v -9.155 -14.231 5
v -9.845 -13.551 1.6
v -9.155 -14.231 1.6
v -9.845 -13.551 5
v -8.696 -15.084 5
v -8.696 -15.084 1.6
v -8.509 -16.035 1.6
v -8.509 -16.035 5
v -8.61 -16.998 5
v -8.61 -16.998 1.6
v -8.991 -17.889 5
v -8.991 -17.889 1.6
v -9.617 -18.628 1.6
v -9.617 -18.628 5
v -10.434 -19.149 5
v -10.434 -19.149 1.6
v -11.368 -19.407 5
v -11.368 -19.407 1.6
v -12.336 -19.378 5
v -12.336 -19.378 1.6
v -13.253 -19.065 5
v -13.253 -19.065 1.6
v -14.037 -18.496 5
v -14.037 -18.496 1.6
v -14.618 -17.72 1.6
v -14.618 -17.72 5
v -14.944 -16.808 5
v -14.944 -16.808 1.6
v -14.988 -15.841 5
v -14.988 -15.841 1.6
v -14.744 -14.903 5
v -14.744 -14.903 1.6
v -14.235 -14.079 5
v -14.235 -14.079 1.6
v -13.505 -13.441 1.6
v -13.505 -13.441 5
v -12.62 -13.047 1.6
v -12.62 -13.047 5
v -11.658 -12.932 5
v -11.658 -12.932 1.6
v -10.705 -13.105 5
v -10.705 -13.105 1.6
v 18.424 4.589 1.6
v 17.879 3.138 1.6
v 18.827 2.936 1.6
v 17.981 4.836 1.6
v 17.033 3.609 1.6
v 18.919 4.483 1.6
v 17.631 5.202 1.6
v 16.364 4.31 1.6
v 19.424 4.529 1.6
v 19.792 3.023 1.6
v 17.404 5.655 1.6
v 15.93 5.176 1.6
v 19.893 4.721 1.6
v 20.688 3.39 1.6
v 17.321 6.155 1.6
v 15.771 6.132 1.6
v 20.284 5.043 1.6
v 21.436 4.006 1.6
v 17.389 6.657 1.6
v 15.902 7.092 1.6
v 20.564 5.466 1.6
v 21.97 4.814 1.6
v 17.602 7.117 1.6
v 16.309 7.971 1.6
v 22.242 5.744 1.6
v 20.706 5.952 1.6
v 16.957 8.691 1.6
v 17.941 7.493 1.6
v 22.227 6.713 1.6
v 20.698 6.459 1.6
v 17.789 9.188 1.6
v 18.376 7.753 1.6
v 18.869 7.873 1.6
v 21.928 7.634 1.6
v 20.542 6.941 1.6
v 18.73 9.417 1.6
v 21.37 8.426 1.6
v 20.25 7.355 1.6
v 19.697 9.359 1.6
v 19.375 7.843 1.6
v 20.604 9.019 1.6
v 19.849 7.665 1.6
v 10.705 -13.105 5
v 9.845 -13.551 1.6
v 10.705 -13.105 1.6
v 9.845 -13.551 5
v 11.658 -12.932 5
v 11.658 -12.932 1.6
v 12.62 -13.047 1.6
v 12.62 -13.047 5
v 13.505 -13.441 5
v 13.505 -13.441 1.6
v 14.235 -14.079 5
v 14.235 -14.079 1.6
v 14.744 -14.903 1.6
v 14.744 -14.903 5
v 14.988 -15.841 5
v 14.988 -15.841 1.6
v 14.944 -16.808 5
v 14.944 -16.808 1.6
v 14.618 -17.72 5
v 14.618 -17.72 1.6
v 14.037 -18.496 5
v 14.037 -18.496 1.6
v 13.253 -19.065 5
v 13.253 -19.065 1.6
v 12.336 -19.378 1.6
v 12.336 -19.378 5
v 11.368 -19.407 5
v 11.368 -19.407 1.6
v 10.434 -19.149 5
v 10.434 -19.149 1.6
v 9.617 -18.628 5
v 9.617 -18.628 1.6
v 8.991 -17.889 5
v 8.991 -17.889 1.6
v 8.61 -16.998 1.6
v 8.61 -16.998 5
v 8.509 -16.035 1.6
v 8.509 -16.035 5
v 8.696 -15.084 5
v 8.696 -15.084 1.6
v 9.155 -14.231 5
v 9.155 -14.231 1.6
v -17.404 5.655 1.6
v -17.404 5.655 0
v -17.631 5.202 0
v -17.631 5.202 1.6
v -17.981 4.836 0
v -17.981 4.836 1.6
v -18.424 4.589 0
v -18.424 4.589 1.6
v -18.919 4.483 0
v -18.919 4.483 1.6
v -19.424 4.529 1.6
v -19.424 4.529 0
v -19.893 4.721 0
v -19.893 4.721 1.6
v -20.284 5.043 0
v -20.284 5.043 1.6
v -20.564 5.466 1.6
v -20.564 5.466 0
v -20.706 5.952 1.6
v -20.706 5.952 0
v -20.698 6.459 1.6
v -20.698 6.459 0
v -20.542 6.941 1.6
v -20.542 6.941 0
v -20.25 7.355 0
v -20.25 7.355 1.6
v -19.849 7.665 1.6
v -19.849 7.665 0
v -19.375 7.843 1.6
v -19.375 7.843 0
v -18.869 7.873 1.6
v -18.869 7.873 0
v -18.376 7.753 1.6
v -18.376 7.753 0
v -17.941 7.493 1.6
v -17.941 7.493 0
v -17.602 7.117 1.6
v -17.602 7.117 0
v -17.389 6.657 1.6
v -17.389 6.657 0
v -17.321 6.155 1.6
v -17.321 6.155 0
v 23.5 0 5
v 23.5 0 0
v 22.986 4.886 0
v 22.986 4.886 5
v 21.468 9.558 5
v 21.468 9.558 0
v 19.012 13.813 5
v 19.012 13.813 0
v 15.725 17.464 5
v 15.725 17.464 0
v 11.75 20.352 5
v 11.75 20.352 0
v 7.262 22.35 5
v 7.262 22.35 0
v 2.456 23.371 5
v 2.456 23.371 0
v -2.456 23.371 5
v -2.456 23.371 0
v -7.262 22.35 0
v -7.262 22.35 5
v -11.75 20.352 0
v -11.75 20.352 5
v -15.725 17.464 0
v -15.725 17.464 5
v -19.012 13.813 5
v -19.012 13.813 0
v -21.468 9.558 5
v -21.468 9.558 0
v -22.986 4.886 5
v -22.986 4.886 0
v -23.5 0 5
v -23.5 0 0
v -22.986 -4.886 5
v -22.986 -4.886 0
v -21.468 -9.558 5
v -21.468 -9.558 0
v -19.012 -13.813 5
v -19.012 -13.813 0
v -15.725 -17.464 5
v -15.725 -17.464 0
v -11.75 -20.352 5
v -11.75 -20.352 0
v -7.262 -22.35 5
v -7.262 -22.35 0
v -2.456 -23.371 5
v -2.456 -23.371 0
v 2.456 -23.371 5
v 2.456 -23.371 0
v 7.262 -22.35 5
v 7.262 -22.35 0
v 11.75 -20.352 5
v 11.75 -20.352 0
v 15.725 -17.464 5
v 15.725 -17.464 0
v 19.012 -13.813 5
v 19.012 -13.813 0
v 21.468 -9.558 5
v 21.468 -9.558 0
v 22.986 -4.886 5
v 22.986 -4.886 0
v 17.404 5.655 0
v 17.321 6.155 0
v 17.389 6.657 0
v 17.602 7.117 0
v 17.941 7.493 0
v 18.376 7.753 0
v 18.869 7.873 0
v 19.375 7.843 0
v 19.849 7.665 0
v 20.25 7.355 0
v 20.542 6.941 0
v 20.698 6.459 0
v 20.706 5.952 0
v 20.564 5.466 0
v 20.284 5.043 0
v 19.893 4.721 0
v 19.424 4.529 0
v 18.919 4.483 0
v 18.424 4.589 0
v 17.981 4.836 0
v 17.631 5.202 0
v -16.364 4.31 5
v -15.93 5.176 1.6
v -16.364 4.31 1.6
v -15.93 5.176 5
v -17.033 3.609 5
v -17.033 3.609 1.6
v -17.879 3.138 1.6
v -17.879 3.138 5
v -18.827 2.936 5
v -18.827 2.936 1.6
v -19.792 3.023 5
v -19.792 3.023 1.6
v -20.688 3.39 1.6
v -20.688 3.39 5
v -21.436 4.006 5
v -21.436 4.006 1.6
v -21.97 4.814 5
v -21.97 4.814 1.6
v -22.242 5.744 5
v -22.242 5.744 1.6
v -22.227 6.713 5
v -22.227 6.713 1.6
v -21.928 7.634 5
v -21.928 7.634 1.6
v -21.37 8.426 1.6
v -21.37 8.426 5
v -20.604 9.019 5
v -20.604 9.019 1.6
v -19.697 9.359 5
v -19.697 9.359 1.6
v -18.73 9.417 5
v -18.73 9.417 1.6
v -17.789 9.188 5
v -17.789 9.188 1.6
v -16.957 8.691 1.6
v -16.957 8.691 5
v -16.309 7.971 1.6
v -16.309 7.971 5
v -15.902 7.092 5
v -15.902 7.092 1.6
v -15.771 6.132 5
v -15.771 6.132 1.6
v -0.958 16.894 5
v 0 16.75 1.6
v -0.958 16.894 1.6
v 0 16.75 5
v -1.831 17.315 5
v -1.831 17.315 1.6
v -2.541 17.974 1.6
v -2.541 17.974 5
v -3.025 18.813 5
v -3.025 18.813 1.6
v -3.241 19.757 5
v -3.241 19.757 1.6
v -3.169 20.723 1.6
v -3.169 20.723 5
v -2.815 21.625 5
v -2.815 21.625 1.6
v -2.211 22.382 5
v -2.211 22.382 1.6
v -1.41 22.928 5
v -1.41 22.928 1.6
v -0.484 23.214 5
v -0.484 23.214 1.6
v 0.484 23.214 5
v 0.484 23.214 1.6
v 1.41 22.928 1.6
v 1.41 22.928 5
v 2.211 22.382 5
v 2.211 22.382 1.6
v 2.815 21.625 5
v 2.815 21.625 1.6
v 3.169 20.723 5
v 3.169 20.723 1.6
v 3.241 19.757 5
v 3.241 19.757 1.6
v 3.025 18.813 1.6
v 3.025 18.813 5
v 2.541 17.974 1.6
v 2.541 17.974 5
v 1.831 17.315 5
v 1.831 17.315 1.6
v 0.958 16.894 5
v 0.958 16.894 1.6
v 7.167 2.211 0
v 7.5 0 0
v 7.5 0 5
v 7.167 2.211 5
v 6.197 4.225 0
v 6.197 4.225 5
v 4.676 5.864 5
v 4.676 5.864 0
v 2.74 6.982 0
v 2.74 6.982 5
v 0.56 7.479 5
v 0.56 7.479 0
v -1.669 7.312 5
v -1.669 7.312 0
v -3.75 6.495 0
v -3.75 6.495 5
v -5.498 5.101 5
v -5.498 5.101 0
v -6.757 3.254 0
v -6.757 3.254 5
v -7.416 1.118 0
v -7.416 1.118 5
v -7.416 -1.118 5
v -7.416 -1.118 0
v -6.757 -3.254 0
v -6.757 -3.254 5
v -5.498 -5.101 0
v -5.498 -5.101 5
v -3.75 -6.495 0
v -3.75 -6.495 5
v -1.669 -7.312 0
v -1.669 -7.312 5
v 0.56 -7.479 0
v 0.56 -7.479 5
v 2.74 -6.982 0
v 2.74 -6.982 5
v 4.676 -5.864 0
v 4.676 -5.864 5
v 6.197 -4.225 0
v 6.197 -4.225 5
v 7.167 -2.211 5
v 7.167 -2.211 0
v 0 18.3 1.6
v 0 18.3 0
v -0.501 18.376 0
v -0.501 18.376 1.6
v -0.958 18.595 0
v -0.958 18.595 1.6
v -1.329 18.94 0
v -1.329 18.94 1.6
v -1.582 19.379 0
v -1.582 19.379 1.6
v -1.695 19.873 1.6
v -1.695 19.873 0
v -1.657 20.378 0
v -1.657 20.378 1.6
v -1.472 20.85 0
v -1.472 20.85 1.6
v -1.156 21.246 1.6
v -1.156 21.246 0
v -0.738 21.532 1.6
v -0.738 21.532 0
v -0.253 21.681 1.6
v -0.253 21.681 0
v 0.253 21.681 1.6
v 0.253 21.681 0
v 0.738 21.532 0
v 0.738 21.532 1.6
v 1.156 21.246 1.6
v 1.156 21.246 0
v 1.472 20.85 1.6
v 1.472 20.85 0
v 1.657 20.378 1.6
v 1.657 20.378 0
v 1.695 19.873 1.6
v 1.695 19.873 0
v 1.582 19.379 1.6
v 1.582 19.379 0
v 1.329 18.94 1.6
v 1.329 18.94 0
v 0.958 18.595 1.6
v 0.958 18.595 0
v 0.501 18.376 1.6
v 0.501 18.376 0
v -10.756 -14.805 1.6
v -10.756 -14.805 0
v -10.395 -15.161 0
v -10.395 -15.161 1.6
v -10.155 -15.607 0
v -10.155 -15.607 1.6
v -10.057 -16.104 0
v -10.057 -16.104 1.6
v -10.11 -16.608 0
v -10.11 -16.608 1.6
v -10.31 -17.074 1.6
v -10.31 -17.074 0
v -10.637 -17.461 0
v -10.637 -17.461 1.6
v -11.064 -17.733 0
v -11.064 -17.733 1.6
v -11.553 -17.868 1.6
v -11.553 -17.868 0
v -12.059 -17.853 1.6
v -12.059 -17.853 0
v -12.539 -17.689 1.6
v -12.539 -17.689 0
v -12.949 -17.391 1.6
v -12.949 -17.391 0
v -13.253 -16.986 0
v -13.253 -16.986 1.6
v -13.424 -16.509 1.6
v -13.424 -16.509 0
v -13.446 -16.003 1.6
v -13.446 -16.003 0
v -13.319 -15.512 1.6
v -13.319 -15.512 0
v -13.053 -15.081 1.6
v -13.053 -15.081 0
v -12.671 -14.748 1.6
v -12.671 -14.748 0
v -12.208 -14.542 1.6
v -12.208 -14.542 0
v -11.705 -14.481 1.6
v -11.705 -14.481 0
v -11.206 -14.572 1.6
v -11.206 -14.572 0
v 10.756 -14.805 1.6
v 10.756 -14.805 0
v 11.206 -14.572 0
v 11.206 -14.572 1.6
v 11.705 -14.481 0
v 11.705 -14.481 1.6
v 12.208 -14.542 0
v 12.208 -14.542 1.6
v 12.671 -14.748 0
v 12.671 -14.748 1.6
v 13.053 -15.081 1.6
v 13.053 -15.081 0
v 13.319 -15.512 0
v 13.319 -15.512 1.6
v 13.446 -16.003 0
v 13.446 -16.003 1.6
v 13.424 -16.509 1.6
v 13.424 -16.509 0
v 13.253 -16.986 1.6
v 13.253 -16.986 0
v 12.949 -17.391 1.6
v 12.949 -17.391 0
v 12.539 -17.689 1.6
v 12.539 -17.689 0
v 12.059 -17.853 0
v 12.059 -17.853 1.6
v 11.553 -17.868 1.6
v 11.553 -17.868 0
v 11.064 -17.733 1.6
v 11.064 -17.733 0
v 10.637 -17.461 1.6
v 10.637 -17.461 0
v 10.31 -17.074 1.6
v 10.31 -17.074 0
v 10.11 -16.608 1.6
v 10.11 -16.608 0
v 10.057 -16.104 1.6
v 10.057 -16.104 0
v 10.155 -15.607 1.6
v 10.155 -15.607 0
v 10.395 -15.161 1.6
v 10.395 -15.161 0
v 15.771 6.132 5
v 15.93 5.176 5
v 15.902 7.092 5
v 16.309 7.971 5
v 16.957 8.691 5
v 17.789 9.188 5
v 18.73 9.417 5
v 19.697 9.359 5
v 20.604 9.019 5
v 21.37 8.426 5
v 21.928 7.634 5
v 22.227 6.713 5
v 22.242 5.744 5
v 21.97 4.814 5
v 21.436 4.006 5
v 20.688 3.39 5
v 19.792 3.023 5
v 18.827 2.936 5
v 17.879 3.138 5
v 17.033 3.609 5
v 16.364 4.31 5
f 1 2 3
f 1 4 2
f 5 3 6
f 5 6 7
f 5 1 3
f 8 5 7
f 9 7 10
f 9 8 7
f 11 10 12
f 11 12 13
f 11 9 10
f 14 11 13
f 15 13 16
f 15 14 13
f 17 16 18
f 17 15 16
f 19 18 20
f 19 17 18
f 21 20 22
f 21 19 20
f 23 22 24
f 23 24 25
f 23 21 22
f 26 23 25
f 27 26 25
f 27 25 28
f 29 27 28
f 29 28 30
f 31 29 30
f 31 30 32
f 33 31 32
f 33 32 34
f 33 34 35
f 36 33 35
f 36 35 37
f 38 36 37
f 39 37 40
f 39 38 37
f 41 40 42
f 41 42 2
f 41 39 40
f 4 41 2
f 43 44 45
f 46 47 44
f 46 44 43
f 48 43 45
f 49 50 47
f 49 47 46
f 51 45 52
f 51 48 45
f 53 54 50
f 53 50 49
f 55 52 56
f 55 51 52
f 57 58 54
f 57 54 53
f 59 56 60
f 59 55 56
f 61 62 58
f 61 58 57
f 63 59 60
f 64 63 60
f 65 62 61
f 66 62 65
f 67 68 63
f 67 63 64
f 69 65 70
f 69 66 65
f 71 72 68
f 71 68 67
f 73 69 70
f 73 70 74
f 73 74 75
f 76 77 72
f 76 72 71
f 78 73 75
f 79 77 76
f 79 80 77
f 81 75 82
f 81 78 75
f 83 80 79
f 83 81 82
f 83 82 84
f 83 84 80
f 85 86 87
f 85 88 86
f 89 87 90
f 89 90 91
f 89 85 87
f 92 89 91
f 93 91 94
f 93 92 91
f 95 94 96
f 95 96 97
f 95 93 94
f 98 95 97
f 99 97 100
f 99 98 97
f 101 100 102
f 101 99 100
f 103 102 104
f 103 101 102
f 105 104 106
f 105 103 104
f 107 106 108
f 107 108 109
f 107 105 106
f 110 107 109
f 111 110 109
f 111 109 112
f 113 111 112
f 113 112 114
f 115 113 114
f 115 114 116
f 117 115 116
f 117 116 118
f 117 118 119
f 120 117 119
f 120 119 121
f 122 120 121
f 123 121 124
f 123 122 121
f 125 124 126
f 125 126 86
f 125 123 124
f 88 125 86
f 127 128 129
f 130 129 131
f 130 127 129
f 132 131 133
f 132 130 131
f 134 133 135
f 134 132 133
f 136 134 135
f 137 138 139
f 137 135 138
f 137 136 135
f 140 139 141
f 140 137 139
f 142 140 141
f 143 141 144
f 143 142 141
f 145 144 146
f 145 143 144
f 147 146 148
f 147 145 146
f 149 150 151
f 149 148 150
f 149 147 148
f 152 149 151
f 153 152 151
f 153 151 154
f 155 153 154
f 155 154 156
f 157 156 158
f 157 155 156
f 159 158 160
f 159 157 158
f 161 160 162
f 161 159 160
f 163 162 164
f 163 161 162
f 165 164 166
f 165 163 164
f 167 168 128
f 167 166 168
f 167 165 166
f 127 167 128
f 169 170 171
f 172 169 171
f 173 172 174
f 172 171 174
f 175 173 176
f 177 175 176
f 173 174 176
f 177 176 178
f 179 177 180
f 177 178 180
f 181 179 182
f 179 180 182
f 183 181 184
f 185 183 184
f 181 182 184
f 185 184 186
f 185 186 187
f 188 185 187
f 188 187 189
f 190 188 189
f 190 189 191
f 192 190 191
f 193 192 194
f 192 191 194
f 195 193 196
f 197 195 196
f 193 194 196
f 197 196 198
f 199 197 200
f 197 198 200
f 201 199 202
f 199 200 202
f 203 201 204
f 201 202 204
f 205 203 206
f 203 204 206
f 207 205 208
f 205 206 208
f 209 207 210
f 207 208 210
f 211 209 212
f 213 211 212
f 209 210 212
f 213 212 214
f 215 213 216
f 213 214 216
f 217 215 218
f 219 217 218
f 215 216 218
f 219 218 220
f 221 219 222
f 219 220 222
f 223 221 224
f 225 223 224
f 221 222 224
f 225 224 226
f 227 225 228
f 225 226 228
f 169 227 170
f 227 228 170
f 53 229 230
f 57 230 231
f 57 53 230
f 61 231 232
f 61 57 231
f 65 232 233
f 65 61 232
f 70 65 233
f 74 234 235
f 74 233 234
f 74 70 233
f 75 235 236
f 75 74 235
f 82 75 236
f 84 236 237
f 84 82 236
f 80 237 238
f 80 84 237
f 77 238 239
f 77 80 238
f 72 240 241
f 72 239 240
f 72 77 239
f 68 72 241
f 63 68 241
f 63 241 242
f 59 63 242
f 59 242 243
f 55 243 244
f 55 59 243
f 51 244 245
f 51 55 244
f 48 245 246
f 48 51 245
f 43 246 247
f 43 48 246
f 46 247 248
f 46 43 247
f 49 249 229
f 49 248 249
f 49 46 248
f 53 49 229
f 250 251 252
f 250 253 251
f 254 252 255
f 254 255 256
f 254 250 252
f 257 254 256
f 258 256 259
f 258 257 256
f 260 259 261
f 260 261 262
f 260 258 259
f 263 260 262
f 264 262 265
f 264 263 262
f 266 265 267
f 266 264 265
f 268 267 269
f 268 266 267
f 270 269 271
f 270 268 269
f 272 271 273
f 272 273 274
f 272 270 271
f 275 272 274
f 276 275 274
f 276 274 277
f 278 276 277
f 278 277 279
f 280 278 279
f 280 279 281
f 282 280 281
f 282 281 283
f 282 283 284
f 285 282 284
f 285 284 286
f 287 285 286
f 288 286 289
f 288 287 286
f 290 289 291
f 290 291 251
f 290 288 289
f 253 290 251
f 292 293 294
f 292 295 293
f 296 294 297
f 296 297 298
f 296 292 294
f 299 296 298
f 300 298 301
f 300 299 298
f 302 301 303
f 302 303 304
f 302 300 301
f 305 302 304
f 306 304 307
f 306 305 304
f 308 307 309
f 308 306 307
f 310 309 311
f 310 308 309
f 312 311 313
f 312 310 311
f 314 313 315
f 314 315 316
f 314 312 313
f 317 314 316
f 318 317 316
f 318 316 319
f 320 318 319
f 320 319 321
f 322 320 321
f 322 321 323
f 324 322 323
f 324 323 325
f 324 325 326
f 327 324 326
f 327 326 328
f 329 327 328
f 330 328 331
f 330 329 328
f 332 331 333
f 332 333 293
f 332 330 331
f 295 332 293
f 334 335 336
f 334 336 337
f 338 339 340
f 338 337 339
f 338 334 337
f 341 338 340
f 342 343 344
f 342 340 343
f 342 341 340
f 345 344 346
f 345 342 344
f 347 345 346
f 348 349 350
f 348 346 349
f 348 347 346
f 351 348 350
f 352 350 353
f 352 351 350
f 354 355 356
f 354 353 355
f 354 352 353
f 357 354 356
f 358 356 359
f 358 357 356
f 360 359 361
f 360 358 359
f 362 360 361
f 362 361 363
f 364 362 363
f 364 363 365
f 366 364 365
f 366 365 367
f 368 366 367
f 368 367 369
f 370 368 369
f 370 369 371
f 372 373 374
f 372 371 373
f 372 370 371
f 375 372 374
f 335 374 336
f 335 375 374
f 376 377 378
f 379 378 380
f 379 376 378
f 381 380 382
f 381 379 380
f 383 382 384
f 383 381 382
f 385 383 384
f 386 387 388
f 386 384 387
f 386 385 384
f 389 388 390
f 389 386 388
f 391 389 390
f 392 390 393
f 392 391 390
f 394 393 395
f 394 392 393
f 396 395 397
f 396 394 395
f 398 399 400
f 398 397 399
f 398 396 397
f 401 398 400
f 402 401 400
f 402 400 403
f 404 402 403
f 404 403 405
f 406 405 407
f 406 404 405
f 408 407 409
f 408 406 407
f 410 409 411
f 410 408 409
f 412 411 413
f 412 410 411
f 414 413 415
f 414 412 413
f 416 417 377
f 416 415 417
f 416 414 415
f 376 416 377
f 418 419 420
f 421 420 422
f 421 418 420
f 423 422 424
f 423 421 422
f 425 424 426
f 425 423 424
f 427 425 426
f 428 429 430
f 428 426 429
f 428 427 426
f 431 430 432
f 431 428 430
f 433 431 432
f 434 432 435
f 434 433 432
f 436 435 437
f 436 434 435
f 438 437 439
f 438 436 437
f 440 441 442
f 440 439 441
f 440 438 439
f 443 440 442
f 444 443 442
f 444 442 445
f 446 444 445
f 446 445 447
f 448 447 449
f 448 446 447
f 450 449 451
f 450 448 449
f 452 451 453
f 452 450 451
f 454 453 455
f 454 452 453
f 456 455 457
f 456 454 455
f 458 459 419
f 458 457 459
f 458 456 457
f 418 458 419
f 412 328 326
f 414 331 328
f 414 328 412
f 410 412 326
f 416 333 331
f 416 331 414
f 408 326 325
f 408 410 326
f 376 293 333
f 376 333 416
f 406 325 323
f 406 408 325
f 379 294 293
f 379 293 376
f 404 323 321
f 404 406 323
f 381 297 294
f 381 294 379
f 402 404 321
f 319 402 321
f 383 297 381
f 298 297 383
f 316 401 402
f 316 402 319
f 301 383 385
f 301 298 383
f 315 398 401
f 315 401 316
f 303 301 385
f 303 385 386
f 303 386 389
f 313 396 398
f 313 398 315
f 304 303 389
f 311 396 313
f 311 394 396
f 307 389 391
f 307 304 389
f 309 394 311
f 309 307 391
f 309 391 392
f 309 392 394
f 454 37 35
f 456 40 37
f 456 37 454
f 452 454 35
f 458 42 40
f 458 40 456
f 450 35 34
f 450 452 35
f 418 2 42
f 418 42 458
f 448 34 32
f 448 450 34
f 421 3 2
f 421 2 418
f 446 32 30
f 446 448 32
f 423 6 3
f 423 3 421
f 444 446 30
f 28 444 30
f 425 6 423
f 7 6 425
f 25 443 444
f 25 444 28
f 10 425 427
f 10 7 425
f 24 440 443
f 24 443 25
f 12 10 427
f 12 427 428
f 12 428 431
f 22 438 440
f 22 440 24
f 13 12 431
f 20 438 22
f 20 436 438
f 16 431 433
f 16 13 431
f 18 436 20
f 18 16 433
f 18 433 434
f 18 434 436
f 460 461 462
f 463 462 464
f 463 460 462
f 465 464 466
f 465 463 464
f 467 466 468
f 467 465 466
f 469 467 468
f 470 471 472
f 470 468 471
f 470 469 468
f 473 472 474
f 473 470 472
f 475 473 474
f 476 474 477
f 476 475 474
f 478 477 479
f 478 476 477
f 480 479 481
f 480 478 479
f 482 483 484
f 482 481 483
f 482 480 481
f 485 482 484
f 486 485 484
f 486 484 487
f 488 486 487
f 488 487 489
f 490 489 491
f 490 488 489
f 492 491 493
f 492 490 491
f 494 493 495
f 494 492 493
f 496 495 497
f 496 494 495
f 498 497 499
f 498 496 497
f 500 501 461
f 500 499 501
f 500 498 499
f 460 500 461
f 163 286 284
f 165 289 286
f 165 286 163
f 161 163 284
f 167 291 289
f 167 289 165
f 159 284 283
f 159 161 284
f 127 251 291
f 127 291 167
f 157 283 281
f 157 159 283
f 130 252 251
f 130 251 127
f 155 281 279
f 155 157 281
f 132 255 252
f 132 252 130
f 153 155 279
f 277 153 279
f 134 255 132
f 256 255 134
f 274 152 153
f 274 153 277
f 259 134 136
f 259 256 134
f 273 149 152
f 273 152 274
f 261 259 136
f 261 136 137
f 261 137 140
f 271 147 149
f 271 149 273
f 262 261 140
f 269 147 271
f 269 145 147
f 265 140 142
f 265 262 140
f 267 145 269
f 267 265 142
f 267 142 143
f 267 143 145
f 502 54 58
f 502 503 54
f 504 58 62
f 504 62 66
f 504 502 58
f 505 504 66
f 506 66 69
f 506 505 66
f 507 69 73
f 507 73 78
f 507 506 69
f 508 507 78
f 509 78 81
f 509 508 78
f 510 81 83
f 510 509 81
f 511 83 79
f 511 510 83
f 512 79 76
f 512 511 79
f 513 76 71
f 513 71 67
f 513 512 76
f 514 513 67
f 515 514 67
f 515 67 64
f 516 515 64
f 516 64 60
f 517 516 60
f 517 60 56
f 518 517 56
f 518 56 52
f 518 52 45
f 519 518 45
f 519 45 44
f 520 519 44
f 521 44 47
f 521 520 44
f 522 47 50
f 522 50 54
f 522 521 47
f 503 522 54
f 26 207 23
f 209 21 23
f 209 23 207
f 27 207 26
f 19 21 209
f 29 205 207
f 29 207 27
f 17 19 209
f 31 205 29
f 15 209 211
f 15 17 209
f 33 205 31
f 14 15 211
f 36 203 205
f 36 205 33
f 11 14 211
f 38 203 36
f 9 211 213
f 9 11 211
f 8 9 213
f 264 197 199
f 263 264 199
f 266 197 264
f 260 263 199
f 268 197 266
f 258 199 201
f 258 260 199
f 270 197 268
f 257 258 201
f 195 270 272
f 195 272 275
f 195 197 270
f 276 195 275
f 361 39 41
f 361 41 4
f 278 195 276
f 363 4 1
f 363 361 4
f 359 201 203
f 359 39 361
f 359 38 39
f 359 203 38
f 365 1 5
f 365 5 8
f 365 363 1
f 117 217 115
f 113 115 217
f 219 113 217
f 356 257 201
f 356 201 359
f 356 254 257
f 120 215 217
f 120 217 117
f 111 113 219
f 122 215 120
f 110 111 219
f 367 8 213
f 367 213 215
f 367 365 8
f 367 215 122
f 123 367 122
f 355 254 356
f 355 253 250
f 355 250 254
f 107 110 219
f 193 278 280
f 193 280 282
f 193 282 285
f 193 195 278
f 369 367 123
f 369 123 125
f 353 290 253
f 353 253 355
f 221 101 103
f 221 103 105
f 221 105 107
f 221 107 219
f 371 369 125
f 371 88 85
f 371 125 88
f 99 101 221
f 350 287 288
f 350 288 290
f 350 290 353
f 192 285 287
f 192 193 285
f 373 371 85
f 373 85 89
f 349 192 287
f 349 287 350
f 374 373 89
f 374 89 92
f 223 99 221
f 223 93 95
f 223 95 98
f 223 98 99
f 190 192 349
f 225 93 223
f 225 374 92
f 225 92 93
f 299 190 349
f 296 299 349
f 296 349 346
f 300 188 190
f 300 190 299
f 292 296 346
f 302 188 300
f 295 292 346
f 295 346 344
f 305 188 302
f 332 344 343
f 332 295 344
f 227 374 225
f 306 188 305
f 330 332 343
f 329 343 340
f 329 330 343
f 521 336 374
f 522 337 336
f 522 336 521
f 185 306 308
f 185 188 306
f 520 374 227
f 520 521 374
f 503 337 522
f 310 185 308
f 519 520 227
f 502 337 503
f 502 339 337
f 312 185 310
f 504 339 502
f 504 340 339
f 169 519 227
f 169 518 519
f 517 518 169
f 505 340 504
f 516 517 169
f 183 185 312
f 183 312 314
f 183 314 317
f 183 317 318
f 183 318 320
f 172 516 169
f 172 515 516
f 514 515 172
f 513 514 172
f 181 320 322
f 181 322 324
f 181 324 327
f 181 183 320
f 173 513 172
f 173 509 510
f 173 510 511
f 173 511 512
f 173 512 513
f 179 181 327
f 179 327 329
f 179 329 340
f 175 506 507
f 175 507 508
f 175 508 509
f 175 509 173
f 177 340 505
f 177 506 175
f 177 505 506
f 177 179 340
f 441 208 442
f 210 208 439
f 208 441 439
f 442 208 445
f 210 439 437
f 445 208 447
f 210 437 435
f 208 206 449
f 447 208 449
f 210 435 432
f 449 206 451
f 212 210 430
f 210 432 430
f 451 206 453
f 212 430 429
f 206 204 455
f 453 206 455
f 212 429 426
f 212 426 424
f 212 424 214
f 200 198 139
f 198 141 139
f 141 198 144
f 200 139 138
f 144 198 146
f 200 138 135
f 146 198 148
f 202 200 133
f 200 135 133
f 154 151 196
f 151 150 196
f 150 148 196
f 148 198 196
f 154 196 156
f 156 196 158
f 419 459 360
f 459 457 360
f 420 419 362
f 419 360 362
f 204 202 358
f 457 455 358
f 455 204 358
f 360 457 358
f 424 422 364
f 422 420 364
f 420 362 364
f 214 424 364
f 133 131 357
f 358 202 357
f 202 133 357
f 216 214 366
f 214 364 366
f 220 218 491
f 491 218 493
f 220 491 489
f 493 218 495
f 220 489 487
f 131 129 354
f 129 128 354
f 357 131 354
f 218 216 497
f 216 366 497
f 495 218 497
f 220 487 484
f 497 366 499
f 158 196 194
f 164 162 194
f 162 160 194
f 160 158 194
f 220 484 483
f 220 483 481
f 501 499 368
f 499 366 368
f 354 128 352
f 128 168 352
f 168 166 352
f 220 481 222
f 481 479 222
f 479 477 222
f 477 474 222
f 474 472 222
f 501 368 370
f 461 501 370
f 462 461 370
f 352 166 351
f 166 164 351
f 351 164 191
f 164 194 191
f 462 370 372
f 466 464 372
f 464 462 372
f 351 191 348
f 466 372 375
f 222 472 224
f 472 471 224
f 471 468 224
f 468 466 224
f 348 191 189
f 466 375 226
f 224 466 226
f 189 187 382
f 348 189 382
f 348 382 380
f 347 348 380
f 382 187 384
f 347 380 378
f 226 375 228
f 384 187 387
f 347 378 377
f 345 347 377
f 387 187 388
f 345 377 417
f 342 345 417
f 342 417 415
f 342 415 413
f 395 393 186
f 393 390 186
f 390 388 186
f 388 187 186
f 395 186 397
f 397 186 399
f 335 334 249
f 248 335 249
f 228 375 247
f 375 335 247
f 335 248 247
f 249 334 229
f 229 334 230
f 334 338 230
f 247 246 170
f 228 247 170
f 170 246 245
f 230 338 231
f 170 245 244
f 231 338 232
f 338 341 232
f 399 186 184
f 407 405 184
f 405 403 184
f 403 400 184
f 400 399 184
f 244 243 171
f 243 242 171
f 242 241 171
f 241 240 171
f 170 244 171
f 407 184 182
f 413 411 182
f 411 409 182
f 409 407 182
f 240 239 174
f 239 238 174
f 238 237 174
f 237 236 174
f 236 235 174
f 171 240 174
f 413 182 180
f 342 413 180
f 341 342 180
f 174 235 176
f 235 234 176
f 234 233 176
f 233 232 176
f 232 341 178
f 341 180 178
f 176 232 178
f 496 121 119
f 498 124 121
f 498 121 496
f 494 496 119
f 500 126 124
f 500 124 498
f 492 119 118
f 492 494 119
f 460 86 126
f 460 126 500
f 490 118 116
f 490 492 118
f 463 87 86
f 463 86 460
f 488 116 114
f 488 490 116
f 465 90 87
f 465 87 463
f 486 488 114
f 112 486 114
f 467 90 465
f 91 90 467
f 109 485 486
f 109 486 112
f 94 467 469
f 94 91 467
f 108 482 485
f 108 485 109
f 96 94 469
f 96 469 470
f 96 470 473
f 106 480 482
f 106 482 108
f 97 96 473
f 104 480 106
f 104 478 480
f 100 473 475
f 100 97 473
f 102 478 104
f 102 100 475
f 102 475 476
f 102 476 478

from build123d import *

# Parameters (mm, degrees)
SKETCH1_R               = 23.5
BOSS_EXTRUDE1_DEPTH     = 5
CUT_EXTRUDE1_DEPTH      = 34.608034754
CUT_EXTRUDE1_DEPTH_BACK = 34.608034754
SKETCH5_R               = 7.5
CIRPATTERN1_COUNT       = 5


with BuildPart() as part:
    # Sketch1 → Boss-Extrude1 (new body)
    with BuildSketch(Plane.XY):
        Circle(SKETCH1_R)
    extrude(amount=BOSS_EXTRUDE1_DEPTH)

    # Sketch5 → Cut-Extrude1 (cut, two sides: drawn at the far end of the back side and taken through both)
    with BuildSketch(Plane.XY.offset(5).offset(-CUT_EXTRUDE1_DEPTH_BACK)):
        Circle(SKETCH5_R)
    extrude(amount=CUT_EXTRUDE1_DEPTH + CUT_EXTRUDE1_DEPTH_BACK, mode=Mode.SUBTRACT)

    # Sketch3 → CBORE for M3 Hex Socket Head Cap Screw1 (revolve, cut)
    with BuildSketch(Plane(origin=(0, 20, 5), x_dir=(0, -1, 0), z_dir=(1, 0, 0))):
        Polygon((0, 0), (0, 16.021463052), (1.7, 15), (1.7, 3.4), (3.25, 3.4), (3.25, 0), align=None)
    cbore_for_m3_hex_socket_head_cap_screw1 = revolve(axis=Axis((0, 20, 11.35), (0, 0, -1)), mode=Mode.SUBTRACT)

    # CirPattern1: CBORE for M3 Hex Socket Head Cap Screw1 ×5 about axis
    cirpattern1_axis = Axis((0, 0, 0), (0, 0, 1))
    for i in range(1, CIRPATTERN1_COUNT):
        add(cbore_for_m3_hex_socket_head_cap_screw1.rotate(cirpattern1_axis, i * 360 / CIRPATTERN1_COUNT), mode=Mode.SUBTRACT)


solid = part.part
